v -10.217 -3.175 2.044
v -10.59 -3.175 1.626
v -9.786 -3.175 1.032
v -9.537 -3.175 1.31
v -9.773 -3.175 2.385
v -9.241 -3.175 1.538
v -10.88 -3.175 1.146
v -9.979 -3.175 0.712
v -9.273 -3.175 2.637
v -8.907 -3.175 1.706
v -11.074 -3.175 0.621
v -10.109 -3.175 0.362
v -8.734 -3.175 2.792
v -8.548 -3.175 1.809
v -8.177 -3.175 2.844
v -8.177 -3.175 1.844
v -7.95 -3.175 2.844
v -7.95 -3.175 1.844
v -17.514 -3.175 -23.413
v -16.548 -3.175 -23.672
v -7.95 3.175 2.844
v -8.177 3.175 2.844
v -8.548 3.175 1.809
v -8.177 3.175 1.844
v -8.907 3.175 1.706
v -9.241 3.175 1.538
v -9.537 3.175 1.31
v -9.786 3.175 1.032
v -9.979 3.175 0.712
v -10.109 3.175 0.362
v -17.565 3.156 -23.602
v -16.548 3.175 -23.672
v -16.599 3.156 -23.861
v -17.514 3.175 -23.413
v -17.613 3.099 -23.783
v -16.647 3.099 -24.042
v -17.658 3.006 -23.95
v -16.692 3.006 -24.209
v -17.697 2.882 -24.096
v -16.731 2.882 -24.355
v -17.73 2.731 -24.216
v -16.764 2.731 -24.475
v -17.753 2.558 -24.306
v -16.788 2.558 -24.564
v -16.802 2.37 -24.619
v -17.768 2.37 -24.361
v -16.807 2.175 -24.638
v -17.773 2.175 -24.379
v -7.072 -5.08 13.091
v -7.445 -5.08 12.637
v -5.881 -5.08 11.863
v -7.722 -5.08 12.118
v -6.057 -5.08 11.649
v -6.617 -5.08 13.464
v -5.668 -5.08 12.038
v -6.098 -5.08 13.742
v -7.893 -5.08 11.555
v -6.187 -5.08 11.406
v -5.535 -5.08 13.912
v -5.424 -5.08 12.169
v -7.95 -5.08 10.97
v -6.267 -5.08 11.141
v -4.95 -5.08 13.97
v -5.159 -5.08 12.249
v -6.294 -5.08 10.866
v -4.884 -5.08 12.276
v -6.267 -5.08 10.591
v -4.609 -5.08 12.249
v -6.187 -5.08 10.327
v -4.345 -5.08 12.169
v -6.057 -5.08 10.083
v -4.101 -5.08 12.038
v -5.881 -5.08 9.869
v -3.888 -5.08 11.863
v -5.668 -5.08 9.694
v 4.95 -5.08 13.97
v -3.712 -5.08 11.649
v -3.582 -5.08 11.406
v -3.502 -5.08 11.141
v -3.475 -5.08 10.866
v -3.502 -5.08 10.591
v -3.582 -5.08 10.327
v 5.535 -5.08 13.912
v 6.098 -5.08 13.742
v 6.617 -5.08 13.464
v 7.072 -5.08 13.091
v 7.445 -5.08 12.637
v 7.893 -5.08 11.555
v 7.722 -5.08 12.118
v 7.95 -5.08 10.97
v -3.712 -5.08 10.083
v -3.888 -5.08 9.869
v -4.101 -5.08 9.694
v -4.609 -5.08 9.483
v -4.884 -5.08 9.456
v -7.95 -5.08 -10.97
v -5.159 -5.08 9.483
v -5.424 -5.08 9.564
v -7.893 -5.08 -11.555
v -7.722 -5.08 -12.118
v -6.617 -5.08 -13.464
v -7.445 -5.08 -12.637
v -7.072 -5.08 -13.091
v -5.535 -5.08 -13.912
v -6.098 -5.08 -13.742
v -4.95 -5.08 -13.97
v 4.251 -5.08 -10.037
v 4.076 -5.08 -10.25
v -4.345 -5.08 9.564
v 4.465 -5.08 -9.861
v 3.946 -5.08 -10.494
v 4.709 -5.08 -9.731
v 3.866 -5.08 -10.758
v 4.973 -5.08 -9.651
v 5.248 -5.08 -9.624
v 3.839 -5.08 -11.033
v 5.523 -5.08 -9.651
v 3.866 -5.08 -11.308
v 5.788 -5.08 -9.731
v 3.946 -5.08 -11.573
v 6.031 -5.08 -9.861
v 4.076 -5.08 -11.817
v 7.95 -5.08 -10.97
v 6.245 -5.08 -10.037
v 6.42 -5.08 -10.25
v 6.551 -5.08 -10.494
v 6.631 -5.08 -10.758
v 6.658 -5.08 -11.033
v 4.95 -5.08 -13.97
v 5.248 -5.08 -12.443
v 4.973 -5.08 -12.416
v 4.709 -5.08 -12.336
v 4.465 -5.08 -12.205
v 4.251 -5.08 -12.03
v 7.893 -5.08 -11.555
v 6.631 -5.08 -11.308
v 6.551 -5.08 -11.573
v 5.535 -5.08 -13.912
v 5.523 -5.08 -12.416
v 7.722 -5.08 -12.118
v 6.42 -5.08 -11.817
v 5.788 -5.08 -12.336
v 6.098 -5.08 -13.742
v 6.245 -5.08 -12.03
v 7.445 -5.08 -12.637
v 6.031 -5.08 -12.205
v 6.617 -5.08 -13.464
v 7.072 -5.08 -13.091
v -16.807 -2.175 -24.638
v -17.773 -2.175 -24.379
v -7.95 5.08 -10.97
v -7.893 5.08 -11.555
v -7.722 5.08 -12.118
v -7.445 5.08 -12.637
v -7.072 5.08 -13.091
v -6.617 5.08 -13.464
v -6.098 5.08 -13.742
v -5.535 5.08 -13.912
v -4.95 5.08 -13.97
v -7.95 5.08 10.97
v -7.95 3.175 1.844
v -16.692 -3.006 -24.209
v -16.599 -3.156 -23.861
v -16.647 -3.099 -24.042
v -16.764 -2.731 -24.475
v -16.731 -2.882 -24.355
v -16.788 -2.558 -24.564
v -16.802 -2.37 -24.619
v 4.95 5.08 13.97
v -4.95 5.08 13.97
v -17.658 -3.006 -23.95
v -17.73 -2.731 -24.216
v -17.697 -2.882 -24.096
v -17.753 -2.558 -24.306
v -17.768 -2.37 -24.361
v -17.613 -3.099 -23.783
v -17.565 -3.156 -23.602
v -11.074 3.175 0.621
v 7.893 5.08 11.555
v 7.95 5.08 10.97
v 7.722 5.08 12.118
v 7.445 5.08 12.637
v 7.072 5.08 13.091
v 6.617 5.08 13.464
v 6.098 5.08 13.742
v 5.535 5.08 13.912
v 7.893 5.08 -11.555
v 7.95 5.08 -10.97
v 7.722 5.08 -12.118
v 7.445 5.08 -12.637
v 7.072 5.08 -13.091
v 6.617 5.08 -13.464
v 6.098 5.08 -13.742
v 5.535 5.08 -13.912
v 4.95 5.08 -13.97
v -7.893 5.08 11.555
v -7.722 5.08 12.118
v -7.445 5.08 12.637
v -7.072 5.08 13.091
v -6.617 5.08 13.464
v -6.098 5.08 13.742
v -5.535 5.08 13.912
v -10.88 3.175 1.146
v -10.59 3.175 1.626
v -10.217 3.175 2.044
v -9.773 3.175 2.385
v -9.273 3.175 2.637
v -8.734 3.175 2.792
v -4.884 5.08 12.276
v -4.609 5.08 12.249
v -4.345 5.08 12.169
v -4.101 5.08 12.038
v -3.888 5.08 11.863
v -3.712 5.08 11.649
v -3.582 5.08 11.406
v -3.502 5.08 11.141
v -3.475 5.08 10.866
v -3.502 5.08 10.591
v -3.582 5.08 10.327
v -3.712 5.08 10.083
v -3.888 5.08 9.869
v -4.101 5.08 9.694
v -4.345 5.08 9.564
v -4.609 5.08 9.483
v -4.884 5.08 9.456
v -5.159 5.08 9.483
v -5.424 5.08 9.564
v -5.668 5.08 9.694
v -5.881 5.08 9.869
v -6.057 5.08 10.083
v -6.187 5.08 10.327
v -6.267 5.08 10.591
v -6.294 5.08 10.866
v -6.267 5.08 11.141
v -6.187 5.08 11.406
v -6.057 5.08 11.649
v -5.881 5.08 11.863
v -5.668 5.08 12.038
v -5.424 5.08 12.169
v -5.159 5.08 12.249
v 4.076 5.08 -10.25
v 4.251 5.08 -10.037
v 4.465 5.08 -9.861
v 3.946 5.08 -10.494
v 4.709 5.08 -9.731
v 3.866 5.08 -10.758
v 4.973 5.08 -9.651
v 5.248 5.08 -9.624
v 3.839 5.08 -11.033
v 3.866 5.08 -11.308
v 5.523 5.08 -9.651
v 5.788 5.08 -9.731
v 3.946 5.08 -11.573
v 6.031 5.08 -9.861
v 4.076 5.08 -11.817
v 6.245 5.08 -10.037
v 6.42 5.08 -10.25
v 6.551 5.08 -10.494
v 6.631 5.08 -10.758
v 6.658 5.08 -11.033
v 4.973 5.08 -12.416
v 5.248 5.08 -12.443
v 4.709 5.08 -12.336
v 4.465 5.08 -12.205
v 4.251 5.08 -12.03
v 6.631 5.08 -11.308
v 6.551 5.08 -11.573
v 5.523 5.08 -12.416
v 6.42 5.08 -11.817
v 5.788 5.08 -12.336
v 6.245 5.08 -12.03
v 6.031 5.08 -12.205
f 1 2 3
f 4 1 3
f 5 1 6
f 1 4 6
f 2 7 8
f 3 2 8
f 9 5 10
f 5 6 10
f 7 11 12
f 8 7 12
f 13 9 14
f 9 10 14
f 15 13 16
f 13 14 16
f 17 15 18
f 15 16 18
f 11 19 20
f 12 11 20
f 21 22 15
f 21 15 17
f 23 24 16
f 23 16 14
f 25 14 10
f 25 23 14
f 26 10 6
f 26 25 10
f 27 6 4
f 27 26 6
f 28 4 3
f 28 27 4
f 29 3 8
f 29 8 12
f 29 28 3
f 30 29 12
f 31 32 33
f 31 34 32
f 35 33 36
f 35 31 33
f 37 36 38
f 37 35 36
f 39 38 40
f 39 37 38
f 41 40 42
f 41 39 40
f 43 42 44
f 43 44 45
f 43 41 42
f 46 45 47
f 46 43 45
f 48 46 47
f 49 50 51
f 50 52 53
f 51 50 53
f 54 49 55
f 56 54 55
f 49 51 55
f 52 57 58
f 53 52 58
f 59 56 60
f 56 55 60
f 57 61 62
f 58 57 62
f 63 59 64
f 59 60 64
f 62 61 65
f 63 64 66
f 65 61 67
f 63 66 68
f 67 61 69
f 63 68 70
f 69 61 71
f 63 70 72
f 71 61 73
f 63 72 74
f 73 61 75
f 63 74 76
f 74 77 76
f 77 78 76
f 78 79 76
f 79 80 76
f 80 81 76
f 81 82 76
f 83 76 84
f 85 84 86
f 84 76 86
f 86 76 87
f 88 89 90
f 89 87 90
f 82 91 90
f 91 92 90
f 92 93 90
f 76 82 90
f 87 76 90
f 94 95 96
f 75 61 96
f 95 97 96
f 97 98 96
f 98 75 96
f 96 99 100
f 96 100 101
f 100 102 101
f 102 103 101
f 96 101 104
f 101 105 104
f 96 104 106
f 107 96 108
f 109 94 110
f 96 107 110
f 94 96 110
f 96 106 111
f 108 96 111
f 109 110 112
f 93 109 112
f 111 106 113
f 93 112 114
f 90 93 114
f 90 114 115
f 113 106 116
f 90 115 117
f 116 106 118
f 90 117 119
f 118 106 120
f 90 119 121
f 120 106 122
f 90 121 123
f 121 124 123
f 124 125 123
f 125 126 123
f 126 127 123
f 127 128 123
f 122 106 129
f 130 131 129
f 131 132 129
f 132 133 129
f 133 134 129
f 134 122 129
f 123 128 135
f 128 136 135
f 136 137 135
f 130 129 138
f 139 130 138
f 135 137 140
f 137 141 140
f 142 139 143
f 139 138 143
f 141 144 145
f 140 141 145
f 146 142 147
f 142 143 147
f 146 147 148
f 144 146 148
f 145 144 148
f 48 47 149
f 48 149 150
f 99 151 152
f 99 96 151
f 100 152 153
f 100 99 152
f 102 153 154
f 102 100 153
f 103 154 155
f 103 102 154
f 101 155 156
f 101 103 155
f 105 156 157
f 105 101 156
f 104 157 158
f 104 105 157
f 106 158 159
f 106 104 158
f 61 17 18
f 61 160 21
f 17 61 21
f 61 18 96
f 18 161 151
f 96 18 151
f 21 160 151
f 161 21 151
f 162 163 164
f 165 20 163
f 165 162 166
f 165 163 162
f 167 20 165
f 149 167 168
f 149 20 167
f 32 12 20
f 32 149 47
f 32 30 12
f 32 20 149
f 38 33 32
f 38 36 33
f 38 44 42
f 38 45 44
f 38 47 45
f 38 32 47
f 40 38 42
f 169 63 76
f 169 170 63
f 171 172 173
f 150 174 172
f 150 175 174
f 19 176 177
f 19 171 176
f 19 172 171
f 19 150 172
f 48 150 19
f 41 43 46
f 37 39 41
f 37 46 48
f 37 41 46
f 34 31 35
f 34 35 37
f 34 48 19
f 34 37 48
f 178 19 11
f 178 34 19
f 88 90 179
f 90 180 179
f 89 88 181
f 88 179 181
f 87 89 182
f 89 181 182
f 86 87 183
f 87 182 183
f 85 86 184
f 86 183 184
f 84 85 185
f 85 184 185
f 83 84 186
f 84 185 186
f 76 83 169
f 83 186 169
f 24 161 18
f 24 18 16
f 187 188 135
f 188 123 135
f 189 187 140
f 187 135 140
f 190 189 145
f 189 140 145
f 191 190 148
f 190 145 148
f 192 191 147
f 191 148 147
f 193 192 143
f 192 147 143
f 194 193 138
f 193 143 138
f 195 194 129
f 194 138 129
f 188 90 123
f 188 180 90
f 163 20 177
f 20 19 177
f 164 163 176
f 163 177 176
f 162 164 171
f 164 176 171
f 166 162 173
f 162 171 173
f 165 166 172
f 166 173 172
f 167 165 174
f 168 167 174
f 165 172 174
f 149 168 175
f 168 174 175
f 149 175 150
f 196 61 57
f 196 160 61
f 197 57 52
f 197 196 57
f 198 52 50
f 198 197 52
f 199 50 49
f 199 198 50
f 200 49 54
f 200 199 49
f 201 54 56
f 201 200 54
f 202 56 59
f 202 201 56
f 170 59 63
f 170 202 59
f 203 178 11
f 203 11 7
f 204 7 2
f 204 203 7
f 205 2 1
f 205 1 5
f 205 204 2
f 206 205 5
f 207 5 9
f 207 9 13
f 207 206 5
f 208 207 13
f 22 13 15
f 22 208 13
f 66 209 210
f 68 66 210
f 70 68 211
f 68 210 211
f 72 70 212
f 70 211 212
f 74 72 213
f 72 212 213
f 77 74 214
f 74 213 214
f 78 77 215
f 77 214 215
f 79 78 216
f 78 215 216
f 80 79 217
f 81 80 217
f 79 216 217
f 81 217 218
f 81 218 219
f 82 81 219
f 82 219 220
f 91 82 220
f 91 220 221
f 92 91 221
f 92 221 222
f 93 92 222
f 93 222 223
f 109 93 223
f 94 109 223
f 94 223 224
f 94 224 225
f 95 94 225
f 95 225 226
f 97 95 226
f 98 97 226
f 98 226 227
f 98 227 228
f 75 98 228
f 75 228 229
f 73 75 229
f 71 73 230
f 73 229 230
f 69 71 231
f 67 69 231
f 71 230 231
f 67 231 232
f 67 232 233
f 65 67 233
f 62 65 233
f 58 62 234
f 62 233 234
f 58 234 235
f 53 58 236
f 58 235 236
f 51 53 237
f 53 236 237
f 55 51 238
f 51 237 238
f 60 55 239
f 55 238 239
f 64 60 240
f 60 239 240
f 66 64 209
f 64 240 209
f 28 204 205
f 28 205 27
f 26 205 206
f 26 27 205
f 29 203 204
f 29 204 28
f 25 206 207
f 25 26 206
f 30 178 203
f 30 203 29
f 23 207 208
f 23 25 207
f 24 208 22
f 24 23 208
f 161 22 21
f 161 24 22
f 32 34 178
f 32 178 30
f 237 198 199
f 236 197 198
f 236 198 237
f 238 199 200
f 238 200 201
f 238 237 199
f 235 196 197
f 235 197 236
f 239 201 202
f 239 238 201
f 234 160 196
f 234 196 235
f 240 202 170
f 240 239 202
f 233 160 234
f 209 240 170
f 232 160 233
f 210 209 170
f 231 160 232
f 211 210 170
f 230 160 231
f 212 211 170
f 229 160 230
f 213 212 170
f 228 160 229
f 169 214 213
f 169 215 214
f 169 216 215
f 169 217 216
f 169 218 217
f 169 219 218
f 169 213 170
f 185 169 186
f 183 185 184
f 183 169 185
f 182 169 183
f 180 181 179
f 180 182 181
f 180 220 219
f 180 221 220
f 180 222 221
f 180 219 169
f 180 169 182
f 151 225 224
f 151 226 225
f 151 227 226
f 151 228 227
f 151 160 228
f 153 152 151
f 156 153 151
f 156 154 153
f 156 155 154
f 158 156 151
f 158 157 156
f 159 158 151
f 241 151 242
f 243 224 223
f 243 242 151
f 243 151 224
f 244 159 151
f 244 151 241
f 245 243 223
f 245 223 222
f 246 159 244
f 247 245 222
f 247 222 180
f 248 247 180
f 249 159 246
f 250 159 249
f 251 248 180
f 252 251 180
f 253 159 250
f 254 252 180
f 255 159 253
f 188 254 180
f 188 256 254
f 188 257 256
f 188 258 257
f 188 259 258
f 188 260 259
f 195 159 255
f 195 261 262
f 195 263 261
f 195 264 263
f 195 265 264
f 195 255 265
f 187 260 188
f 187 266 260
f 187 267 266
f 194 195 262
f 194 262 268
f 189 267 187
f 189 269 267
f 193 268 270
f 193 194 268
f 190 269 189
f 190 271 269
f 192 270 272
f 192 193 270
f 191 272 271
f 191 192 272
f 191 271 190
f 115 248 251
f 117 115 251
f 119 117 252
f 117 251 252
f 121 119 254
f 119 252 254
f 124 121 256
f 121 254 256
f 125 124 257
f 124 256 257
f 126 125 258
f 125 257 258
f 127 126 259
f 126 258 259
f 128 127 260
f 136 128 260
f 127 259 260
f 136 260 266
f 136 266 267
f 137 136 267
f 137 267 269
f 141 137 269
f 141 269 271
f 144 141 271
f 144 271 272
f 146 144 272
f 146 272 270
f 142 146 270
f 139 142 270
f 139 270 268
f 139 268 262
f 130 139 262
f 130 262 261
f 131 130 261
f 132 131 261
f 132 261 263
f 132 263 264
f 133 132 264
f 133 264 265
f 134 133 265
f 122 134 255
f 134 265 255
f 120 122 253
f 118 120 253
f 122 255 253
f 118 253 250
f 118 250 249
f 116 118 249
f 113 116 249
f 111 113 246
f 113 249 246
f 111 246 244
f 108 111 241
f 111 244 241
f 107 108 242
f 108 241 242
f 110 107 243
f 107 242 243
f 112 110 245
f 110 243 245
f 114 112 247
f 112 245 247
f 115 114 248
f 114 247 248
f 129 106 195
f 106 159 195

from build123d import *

# Parameters (mm, degrees)
SKETCH1_W           = 15.9004
SKETCH1_H           = 27.94
BOSS_EXTRUDE1_DEPTH = 5.08
FILLET1_R           = 3
BOSS_EXTRUDE2_DEPTH = 3.175
FILLET2_R           = 1
SKETCH3_R           = 1.4097
CUT_EXTRUDE1_DEPTH  = 16.35


with BuildPart() as part:
    # Sketch1 → Boss-Extrude1 (new, symmetric)
    with BuildSketch(Plane(origin=(0, 0, 0), x_dir=(1, 0, 0), z_dir=(0, 1, 0))):
        Rectangle(SKETCH1_W, SKETCH1_H)
    extrude(amount=BOSS_EXTRUDE1_DEPTH, both=True)

    # Fillet1
    fillet1_edges = [part.edges().sort_by_distance(p)[0] for p in [
        (7.9502, 0, 13.97),
        (-7.9502, 0, 13.97),
        (-7.9502, 0, -13.97),
        (7.9502, 0, -13.97),
    ]]
    fillet(fillet1_edges, radius=FILLET1_R)

    # Sketch2 → Boss-Extrude2 (add, symmetric)
    with BuildSketch(Plane(origin=(0, 0, 0), x_dir=(1, 0, 0), z_dir=(0, 1, 0))):
        with BuildLine():
            Line((-17.773175009, 24.379180955), (-11.074445198, -0.620819045))
            ThreePointArc((-11.074445198, -0.620819045), (-10.002952006, -2.224421931), (-8.176667719, -2.84436191))
            Line((-8.176667719, -2.84436191), (-3.749367894, -2.84436191))
            Line((-3.749367894, -2.84436191), (-3.749367894, -1.84436191))
            Line((-3.749367894, -1.84436191), (-8.176667719, -1.84436191))
            ThreePointArc((-8.176667719, -1.84436191), (-9.394190577, -1.43106859), (-10.108519372, -0.362))
            Line((-10.108519372, -0.362), (-16.807249182, 24.638))
            Line((-16.807249182, 24.638), (-17.773175009, 24.379180955))
        make_face()
    extrude(amount=BOSS_EXTRUDE2_DEPTH, both=True)

    # Fillet2
    fillet2_edges = [part.edges().sort_by_distance(p)[0] for p in [
        (-17.290212095, 3.175, -24.508590477),
        (-17.290212095, -3.175, -24.508590477),
    ]]
    fillet(fillet2_edges, radius=FILLET2_R)

    # Sketch3 → Cut-Extrude1 (cut)
    with BuildSketch(Plane(origin=(0, 5.08, 0), x_dir=(1, 0, 0), z_dir=(0, 1, 0))):
        with Locations(Location((5.248249785, 11.033336761, 0), (0, 0, 270))):
            Circle(SKETCH3_R)
        with Locations(Location((-4.884430829, -10.866108062, 0), (0, 0, 270))):
            Circle(SKETCH3_R)
    extrude(amount=-CUT_EXTRUDE1_DEPTH, mode=Mode.SUBTRACT)


solid = part.part
